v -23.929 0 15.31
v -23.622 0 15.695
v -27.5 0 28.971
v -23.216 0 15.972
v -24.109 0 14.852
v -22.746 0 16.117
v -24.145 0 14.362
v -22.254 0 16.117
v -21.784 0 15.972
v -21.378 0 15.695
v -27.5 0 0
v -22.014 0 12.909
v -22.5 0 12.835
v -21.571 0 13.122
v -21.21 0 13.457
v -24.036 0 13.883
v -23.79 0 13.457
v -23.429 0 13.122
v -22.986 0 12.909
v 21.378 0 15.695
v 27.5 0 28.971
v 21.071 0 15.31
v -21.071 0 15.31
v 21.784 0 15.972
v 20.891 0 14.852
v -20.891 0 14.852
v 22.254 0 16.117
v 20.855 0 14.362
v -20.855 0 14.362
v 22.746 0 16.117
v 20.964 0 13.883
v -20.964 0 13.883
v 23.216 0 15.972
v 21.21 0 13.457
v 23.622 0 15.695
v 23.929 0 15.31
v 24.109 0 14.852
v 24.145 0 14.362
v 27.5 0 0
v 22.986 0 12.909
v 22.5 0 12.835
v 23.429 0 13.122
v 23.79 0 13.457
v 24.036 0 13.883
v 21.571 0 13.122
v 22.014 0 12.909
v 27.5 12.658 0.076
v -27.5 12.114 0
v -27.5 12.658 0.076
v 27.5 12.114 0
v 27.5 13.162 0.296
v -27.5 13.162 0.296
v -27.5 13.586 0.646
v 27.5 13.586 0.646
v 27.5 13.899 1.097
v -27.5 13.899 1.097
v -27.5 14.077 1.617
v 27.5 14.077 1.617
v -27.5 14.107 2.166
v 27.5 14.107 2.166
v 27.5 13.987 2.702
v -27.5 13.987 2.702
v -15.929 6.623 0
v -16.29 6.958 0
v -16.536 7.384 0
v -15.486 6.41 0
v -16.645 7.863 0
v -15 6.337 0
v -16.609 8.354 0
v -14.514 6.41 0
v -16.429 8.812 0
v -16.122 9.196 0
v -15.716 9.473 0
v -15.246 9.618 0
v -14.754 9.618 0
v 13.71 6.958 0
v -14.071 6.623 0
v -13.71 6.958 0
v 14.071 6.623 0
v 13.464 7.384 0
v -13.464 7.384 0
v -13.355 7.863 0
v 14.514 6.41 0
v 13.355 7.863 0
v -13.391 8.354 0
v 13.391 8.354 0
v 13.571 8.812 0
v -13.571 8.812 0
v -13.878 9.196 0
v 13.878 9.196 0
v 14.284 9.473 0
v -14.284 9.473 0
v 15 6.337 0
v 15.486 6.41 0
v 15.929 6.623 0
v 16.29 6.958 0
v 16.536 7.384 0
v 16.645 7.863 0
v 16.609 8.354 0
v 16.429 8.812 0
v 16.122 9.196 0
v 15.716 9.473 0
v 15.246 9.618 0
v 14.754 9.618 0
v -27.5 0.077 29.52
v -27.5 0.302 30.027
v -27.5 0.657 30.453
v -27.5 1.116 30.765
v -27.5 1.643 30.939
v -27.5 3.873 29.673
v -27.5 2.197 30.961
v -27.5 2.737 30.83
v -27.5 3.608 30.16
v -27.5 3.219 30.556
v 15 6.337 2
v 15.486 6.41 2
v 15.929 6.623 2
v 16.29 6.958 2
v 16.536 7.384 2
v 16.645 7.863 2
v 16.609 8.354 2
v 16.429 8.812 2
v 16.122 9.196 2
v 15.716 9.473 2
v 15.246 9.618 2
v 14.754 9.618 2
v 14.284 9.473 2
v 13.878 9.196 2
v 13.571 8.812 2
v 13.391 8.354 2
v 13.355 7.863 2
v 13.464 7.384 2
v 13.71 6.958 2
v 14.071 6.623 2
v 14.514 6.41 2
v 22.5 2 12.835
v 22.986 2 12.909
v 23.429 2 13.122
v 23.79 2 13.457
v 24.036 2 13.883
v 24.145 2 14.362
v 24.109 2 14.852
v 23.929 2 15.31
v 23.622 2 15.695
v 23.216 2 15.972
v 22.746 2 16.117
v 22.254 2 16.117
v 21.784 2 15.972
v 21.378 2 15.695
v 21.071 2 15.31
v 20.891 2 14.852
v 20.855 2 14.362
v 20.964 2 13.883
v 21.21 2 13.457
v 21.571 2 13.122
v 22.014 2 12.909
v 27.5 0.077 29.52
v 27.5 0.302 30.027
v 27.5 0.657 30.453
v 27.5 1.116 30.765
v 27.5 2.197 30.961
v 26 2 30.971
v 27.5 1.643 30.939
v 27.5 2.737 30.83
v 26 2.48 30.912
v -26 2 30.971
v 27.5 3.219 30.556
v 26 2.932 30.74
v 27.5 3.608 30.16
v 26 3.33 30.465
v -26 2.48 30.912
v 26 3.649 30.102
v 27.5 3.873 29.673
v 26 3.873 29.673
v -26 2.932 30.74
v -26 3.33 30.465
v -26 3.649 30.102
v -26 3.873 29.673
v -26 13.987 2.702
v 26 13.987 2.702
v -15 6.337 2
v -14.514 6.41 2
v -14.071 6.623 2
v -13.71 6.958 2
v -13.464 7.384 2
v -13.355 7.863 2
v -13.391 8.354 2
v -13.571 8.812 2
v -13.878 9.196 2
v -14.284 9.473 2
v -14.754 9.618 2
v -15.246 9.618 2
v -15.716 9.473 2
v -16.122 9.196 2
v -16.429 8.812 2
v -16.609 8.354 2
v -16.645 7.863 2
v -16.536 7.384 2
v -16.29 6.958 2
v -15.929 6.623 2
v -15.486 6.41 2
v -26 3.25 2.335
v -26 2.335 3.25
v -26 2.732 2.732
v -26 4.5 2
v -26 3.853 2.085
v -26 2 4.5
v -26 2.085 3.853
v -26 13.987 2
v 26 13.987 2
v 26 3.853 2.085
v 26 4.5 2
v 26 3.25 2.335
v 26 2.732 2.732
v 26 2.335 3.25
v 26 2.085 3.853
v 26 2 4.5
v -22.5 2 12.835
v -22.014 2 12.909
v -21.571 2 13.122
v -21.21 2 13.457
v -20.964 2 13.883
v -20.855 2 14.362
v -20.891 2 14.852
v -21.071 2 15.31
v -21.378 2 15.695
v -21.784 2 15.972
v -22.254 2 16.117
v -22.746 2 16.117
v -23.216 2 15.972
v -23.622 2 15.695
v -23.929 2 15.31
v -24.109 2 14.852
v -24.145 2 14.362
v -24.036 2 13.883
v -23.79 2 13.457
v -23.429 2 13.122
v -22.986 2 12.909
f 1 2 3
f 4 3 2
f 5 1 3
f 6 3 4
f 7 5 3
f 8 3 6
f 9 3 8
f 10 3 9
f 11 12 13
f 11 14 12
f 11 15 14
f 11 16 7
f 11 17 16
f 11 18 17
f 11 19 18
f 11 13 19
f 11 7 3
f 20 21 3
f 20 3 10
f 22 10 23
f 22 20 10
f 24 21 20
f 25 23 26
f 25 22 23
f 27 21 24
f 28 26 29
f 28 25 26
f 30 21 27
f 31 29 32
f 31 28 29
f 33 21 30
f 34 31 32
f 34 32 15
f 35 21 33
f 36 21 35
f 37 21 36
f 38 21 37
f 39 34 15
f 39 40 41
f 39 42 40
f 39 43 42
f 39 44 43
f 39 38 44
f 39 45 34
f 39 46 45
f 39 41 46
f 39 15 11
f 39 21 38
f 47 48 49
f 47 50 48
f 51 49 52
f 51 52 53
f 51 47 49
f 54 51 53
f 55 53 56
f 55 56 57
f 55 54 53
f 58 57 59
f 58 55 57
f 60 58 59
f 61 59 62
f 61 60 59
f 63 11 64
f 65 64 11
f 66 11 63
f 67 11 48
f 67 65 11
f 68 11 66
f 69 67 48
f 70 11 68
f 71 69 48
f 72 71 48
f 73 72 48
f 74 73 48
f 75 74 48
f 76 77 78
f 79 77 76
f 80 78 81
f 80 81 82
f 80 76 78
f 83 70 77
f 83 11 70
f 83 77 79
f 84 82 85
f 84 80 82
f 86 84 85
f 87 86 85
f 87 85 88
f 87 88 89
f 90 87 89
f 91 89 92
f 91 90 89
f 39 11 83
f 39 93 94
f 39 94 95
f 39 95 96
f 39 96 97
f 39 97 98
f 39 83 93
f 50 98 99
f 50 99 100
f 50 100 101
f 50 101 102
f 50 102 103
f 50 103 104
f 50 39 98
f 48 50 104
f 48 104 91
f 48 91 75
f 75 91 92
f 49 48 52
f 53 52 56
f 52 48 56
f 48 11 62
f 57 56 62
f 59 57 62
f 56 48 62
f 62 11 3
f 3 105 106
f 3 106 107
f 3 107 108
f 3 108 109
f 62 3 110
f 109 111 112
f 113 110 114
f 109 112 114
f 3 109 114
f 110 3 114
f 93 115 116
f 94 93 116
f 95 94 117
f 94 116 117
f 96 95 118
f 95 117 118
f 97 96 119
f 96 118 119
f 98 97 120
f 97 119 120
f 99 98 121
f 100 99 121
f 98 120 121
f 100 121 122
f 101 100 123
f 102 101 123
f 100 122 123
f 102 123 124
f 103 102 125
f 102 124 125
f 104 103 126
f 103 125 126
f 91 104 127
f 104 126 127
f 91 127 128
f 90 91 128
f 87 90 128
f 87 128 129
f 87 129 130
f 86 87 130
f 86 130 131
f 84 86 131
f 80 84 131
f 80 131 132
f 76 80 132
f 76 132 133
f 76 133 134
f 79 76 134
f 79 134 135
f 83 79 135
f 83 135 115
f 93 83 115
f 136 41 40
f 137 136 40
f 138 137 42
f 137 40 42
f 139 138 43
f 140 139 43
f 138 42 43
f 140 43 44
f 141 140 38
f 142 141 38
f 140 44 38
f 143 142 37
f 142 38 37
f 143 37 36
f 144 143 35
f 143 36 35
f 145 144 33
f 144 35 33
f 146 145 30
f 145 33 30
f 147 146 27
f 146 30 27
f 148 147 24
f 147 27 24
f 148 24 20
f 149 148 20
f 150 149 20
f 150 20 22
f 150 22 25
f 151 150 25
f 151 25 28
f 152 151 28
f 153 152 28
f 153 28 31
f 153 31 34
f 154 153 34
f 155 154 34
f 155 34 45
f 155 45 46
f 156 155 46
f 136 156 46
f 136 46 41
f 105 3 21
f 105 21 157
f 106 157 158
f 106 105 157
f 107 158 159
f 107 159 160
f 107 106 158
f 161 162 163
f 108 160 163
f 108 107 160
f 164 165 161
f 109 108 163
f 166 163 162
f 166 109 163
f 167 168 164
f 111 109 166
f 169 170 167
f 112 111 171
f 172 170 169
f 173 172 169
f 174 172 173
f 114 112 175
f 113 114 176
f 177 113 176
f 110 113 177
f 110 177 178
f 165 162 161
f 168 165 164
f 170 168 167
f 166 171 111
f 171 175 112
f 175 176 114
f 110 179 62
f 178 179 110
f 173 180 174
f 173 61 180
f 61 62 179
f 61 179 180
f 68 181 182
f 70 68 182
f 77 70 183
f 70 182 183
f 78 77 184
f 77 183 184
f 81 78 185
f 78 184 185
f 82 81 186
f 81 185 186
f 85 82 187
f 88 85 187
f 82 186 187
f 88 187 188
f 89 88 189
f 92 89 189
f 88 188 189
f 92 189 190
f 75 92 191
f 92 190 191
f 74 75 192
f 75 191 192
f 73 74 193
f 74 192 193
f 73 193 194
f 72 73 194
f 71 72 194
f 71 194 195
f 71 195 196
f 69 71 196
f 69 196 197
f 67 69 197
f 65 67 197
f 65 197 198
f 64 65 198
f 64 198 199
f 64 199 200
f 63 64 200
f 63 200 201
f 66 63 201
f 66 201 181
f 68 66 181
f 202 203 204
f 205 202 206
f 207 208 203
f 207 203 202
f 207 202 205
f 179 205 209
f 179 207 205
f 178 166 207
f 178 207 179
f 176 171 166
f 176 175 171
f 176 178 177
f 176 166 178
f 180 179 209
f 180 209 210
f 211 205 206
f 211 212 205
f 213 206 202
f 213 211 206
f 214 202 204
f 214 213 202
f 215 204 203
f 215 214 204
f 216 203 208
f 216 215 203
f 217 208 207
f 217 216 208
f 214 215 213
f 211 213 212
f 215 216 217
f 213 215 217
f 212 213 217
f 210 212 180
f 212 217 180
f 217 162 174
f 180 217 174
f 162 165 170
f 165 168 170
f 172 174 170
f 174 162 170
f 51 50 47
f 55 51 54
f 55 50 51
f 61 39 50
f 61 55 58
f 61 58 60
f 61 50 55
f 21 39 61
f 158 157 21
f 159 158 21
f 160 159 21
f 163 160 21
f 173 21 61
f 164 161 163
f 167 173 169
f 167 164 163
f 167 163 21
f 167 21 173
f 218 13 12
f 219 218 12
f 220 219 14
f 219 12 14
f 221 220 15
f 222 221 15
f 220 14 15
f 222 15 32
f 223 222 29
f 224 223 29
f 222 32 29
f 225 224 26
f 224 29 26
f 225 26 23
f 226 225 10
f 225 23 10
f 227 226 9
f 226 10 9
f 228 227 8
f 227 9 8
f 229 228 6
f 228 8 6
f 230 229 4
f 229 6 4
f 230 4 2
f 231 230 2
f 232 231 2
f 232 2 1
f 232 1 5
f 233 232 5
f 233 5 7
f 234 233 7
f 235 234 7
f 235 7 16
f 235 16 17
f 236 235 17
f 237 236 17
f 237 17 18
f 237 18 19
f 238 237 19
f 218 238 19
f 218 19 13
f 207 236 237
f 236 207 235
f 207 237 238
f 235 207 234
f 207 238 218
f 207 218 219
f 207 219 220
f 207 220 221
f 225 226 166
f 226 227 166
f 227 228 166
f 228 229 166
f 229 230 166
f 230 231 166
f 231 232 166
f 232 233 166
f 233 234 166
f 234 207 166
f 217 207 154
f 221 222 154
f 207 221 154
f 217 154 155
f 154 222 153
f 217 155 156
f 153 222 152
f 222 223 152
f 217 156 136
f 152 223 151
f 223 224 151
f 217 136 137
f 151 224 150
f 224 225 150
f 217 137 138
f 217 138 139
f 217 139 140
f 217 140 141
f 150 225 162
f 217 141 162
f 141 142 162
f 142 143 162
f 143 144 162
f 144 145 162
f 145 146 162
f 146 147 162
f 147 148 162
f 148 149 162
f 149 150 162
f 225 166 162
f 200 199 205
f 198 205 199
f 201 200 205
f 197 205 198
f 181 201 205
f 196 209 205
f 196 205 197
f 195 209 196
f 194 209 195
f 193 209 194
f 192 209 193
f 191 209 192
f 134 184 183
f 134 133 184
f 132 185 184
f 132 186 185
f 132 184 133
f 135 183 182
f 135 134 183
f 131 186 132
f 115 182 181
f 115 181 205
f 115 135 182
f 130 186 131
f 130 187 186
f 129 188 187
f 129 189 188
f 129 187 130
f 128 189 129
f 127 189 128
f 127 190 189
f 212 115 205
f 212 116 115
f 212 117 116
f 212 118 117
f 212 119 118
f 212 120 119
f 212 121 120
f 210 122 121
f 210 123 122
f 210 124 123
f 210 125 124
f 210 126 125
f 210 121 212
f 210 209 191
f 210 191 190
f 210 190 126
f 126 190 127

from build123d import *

# Parameters (mm, degrees)
PAD_DEPTH       = 27.5
PAD_DEPTH_BACK  = 27.5
FILLET_R        = 2
SKETCH001_W     = 52
SKETCH001_H     = 11.986657
POCKET_DEPTH    = 30
SKETCH002_R     = 1.65
POCKET001_DEPTH = 14.114999
SKETCH003_R     = 1.65
POCKET002_DEPTH = 2.001
FILLET001_R     = 2.5


with BuildPart() as part:
    # Sketch → Pad (new body, two sides)
    with BuildSketch(Plane.YZ) as pad_sk:
        Polygon((0, 0), (15, 0), (0, 40), align=None)
    extrude(amount=PAD_DEPTH)
    extrude(pad_sk.sketch, amount=-PAD_DEPTH_BACK)

    # Fillet
    fillet_edges = [part.edges().sort_by_distance(p)[0] for p in [
        (0, 0, 40),
        (0, 15, 0),
    ]]
    fillet(fillet_edges, radius=FILLET_R)

    # Sketch001 (on DatumPlane) → Pocket (cut)
    with BuildSketch(Plane.XY.offset(32)):
        with Locations((0, 7.993328)):
            Rectangle(SKETCH001_W, SKETCH001_H)
    extrude(amount=-POCKET_DEPTH, mode=Mode.SUBTRACT)

    # Sketch002 (on Face4 of Pocket) → Pocket001 (cut, through all)
    with BuildSketch(Plane(origin=(0, 0, 0), x_dir=(0, 0, -1), z_dir=(0, -1, 0))):
        with Locations((-14.485332, 22.5)):
            Circle(SKETCH002_R)
        with Locations((-14.485332, -22.5)):
            Circle(SKETCH002_R)
    extrude(amount=-POCKET001_DEPTH, mode=Mode.SUBTRACT)

    # Sketch003 (on Face15 of Pocket001) → Pocket002 (cut, through all)
    with BuildSketch(Plane(origin=(0, 0, 2), x_dir=(0, -1, 0), z_dir=(0, 0, 1))):
        with Locations((-7.986657, 15)):
            Circle(SKETCH003_R)
        with Locations((-7.986657, -15)):
            Circle(SKETCH003_R)
    extrude(amount=-POCKET002_DEPTH, mode=Mode.SUBTRACT)

    # Fillet001
    fillet001_edges = [part.edges().sort_by_distance(p)[0] for p in [
        (0, 2, 2),
    ]]
    fillet(fillet001_edges, radius=FILLET001_R)


solid = part.part
